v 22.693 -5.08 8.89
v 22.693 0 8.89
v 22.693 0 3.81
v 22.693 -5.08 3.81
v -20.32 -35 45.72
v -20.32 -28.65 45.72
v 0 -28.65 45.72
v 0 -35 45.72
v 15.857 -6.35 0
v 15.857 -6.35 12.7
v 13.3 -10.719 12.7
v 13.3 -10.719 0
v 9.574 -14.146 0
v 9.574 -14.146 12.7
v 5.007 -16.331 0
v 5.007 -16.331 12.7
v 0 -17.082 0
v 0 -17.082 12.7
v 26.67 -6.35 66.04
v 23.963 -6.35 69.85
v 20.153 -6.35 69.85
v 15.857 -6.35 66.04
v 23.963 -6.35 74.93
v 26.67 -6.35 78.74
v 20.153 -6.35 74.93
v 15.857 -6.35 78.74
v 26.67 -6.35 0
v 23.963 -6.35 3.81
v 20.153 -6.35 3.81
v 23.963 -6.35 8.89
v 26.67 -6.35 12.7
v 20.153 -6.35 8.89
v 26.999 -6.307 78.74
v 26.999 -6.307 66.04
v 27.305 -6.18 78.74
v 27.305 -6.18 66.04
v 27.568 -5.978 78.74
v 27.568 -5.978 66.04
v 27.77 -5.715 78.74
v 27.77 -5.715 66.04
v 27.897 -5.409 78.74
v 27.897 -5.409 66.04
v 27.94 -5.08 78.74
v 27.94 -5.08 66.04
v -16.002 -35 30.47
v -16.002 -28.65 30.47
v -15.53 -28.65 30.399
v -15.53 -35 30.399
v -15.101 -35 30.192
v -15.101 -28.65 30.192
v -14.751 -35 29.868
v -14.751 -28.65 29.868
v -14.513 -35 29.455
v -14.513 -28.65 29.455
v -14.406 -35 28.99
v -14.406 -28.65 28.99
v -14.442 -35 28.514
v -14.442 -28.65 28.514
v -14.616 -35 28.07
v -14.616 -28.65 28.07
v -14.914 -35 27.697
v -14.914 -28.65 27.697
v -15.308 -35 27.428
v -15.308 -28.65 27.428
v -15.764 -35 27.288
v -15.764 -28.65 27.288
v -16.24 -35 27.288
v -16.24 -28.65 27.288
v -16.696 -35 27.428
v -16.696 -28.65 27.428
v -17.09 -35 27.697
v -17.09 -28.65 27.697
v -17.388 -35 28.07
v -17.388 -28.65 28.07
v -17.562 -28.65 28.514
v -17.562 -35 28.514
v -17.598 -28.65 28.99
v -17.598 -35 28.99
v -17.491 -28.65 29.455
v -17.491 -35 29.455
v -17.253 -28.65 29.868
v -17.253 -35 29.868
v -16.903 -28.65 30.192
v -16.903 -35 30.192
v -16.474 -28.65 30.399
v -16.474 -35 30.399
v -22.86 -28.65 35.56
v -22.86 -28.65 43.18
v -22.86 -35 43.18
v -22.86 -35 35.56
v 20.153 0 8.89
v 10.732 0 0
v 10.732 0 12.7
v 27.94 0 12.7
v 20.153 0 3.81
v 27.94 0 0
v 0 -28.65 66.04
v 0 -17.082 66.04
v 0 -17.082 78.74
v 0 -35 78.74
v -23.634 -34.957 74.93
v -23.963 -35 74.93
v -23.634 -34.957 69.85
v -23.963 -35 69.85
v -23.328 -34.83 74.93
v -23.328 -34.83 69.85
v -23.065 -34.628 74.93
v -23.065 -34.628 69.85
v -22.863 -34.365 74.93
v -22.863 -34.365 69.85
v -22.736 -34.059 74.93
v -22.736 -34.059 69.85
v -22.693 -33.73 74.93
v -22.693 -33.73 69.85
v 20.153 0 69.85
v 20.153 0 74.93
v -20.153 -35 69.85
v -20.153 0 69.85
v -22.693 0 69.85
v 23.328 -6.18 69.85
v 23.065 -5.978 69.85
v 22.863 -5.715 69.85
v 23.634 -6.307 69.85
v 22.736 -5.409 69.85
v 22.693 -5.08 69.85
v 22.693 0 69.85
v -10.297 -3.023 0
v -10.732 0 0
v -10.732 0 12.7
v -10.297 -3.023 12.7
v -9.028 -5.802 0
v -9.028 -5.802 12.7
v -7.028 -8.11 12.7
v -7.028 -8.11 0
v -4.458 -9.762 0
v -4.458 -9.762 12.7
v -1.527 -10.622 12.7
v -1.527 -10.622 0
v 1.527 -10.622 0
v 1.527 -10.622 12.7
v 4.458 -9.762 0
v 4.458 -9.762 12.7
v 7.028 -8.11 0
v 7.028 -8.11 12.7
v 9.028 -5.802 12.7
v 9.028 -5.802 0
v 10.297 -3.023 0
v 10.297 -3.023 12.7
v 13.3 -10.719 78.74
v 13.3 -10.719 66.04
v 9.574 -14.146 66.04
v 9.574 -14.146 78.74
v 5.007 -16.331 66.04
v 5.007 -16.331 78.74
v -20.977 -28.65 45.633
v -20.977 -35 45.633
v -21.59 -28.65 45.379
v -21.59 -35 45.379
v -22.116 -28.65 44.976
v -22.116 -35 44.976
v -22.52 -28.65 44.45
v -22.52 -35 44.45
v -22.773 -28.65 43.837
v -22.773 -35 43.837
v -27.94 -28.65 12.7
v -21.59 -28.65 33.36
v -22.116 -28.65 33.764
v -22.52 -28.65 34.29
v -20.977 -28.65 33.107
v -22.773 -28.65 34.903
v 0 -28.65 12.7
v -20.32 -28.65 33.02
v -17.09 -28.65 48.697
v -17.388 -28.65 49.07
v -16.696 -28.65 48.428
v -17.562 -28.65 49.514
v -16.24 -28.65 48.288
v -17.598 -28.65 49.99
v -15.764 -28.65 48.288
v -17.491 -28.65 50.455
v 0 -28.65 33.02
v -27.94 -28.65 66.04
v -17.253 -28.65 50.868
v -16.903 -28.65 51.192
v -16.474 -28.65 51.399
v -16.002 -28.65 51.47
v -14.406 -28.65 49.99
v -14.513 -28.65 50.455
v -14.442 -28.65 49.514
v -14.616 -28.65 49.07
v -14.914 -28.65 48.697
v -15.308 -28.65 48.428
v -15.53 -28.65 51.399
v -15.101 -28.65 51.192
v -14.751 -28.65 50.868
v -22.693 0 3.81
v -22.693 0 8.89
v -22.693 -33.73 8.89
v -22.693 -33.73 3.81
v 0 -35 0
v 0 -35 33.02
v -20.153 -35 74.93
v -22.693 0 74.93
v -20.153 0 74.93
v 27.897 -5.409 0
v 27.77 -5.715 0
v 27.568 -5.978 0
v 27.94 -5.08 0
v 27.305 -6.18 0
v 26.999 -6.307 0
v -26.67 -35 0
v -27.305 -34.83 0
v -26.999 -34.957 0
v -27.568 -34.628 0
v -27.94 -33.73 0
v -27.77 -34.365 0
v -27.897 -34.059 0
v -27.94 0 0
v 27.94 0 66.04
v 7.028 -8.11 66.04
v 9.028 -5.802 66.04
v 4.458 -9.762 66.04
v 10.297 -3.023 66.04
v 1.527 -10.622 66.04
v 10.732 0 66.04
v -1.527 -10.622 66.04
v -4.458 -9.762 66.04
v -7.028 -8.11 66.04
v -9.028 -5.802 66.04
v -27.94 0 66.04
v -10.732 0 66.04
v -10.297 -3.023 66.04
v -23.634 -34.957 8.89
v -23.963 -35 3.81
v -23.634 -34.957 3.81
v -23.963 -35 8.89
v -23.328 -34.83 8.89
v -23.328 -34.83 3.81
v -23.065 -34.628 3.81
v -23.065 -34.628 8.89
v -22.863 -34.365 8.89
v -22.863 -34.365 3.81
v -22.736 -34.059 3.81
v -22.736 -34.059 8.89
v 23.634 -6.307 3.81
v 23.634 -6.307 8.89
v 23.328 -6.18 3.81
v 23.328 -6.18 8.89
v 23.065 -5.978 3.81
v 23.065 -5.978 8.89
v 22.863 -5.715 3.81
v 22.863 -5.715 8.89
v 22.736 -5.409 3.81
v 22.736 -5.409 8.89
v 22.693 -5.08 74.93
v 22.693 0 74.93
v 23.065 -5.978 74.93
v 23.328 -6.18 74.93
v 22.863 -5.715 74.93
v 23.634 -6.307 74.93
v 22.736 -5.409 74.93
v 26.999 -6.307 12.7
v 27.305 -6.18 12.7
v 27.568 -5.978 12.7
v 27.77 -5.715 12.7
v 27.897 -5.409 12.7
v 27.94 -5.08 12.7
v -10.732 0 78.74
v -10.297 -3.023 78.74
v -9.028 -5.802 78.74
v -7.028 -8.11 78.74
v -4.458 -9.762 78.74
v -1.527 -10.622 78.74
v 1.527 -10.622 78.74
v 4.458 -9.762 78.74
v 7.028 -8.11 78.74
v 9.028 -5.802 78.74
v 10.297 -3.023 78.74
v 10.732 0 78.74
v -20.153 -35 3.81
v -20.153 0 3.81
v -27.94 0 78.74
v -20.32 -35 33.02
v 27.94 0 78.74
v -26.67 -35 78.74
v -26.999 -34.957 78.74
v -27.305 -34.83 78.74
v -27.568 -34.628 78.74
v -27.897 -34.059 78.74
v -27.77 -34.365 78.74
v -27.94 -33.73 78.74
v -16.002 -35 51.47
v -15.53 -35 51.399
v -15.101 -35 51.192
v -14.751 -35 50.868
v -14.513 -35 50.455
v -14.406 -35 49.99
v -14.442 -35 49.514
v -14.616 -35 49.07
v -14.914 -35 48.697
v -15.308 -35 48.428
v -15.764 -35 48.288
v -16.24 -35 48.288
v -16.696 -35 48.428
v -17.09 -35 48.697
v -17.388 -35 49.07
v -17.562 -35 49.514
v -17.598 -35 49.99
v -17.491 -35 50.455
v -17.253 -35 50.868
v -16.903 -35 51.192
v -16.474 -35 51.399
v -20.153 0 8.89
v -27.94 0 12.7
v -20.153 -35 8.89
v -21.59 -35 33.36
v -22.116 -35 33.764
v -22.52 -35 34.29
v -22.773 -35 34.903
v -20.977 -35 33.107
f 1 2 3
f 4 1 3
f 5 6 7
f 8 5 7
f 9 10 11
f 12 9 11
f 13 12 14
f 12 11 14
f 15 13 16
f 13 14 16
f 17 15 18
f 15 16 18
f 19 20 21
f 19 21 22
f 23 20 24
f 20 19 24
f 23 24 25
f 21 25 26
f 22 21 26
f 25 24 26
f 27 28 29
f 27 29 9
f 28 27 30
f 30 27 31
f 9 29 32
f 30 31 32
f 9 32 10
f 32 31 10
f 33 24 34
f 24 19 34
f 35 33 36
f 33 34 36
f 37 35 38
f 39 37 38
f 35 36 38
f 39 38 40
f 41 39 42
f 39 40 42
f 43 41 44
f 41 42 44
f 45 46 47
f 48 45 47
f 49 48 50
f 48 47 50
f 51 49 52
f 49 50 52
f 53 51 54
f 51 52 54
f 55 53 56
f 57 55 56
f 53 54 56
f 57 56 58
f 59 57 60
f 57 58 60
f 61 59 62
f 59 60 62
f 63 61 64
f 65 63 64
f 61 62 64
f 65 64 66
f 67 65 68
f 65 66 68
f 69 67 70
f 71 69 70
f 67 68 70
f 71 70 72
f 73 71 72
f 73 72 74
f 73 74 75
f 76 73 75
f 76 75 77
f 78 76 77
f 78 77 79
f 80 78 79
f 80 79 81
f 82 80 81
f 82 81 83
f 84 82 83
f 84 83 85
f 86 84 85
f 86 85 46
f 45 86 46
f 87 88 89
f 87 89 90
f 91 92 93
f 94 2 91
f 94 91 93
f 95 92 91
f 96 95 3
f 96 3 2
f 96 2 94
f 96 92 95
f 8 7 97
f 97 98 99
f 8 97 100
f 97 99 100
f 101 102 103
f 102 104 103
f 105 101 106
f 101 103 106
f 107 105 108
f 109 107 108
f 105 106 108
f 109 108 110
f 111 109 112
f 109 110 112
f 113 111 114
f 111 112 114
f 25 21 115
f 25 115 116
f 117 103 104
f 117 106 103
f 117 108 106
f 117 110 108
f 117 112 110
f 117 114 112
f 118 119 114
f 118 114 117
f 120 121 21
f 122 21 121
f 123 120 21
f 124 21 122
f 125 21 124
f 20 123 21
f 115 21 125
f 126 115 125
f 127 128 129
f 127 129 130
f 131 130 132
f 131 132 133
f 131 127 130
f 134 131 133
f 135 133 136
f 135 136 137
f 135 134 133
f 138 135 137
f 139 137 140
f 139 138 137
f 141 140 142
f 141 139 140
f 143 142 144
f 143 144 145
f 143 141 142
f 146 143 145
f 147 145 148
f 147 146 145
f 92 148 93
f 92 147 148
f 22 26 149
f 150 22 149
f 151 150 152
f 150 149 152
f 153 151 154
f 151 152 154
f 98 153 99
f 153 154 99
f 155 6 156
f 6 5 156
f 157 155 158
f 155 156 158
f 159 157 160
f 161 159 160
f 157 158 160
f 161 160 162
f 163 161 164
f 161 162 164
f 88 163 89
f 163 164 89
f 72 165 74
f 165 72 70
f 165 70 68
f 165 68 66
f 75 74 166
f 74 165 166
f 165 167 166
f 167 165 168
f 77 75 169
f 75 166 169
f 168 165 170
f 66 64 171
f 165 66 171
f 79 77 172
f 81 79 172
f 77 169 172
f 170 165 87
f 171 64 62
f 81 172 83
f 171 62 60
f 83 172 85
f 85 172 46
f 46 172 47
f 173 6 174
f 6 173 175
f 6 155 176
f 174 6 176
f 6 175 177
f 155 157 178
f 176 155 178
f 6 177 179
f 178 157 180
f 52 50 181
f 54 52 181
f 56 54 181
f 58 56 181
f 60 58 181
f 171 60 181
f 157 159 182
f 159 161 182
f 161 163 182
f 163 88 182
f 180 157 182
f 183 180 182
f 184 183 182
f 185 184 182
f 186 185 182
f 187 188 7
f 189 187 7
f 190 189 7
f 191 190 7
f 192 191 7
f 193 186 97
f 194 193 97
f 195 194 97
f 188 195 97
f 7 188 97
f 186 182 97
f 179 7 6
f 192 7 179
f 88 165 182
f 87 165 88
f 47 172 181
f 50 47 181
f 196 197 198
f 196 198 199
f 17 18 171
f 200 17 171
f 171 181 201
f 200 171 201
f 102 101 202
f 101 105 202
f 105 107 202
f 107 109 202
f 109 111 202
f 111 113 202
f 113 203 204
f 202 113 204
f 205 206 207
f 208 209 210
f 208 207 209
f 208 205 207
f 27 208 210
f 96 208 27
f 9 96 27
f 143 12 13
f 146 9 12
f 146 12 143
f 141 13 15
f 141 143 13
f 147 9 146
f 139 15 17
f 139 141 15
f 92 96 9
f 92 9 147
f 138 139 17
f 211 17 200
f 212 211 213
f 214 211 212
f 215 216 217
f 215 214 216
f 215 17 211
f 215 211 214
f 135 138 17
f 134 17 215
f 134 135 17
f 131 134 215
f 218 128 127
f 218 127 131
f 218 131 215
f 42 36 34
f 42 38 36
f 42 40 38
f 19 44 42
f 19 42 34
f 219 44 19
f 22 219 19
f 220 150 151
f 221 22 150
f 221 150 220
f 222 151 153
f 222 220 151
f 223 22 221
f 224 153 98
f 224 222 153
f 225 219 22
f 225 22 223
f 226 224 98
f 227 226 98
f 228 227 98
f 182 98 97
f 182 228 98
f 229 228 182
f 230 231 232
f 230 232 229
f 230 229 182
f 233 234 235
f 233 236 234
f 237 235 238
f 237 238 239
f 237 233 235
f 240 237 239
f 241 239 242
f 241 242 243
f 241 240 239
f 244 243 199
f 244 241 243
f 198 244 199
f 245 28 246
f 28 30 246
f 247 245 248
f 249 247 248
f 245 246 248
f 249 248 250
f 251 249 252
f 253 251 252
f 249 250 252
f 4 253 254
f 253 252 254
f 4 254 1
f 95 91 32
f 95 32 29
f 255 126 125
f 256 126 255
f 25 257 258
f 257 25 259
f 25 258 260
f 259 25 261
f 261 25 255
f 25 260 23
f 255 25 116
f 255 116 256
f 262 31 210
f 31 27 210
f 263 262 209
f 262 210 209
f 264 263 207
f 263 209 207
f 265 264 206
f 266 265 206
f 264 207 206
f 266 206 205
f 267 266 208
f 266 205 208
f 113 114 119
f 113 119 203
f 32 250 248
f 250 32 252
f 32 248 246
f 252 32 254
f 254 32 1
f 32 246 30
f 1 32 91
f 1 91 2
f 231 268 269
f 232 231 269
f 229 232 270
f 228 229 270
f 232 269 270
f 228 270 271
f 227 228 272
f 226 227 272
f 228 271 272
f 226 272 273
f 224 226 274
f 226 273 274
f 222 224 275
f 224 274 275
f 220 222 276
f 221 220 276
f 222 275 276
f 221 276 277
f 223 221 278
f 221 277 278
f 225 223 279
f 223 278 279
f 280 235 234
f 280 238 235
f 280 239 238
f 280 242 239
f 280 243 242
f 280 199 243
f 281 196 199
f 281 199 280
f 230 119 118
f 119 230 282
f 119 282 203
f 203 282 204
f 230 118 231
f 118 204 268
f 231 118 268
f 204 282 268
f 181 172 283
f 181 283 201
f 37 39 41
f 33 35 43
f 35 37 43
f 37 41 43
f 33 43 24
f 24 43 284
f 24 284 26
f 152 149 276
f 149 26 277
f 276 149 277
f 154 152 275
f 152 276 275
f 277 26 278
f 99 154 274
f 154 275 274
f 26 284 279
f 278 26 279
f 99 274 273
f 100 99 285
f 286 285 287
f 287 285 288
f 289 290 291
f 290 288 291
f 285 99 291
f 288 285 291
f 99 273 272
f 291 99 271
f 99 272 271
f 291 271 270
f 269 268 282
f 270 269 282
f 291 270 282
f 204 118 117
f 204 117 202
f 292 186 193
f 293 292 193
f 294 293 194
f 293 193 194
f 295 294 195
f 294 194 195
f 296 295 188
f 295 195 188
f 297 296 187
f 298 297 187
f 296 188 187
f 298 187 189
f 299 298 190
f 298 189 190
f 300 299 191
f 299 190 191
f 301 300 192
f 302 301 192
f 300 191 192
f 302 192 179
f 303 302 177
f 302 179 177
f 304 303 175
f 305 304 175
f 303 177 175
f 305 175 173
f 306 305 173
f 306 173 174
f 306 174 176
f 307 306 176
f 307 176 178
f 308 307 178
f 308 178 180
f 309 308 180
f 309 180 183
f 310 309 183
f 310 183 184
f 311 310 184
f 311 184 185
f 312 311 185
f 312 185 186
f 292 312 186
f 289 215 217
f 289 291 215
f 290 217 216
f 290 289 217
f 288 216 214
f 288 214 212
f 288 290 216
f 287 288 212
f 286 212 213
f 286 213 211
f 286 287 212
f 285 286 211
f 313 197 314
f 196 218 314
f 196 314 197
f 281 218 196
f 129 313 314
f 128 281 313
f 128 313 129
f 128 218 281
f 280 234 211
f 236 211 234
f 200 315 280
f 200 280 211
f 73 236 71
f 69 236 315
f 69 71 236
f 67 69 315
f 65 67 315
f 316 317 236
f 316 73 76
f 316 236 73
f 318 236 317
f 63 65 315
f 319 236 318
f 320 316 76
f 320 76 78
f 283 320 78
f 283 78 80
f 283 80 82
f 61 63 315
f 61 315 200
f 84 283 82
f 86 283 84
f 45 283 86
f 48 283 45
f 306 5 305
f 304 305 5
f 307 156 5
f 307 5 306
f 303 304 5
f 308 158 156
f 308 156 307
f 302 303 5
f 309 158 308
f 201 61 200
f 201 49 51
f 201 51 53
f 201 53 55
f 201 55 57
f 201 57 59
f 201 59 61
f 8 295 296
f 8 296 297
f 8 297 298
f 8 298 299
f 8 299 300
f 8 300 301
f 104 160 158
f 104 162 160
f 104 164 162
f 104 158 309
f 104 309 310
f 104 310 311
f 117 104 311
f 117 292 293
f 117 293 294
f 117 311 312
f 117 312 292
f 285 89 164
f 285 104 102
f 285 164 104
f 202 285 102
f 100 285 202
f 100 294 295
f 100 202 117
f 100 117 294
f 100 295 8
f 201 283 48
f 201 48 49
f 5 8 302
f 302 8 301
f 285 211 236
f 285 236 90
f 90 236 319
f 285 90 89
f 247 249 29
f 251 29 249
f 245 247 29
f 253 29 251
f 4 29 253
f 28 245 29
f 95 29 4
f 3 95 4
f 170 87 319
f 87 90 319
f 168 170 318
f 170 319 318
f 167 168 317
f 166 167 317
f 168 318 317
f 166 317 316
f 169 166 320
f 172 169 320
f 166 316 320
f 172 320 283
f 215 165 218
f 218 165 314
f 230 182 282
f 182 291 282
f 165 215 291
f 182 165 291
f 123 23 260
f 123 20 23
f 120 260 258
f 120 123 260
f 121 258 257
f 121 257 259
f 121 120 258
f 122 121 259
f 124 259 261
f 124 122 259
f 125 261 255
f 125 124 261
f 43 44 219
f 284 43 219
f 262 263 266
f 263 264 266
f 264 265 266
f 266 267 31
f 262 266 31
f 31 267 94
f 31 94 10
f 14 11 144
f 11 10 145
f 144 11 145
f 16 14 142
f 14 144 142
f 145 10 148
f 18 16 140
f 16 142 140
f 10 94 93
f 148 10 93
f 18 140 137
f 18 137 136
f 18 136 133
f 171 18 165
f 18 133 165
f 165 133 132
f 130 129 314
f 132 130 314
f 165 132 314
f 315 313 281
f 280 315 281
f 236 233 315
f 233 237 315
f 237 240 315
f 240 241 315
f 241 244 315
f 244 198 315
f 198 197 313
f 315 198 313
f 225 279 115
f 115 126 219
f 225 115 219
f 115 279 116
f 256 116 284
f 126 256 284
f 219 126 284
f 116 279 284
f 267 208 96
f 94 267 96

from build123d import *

# Parameters (mm, degrees)
BOSS_EXTRUDE1_DEPTH = 12.7
SKETCH3_W           = 2.54
SKETCH3_H           = 5.08
CUT_EXTRUDE1_DEPTH  = 47.550334048
SKETCH4_W           = 55.88
SKETCH4_H           = 6.35
BOSS_EXTRUDE2_DEPTH = 26.67
SKETCH5_R           = 1.6
SKETCH5_W           = 31.75
SKETCH5_H           = 12.699510518
CUT_EXTRUDE3_DEPTH  = 89.325838235
CUT_EXTRUDE4_REACH  = 92.585
FILLET1_R           = 1.27
FILLET2_R           = 2.54


with BuildPart() as part:
    # Sketch2 → Boss-Extrude1 (new body)
    with BuildSketch(Plane.XY):
        with BuildLine():
            Line((-27.94, 0), (-10.7315, 0))
            ThreePointArc((-10.7315, 0), (0, -10.7315), (10.7315, 0))
            Line((10.7315, 0), (27.94, 0))
            Line((27.94, 0), (27.94, -35))
            Line((27.94, -35), (-27.94, -35))
            Line((-27.94, -35), (-27.94, 0))
        make_face()
    extrude(amount=BOSS_EXTRUDE1_DEPTH)

    # Sketch3 → Cut-Extrude1 (cut, through all)
    with BuildSketch(Plane(origin=(0, 0, 0), x_dir=(1, 0, 0), z_dir=(0, 1, 0))):
        with Locations((-21.423122, -6.35)):
            Rectangle(SKETCH3_W, SKETCH3_H)
        with Locations((21.423122, -6.35)):
            Rectangle(SKETCH3_W, SKETCH3_H)
    extrude(amount=-CUT_EXTRUDE1_DEPTH, mode=Mode.SUBTRACT)

    # Sketch4 → Boss-Extrude2 (add)
    with BuildSketch(Plane.XY.offset(12.7)):
        with Locations((0, -31.825)):
            Rectangle(SKETCH4_W, SKETCH4_H)
    extrude(amount=BOSS_EXTRUDE2_DEPTH)

    # Mirror1: part across plane


with BuildPart() as part_1:
    add(part.part)
    add(part.part.mirror(Plane(origin=(0, 0, 39.37), x_dir=(1, 0, 0), z_dir=(0, 0, -1))))

    # Sketch5 → Cut-Extrude3 (cut, through all)
    with BuildSketch(Plane(origin=(0, -28.65, 0), x_dir=(1, 0, 0), z_dir=(0, 1, 0))):
        with Locations(Location((-16.002, -28.87, 0), (0, 0, 270))):
            Circle(SKETCH5_R)
        with Locations(Location((-16.002, -49.87, 0), (0, 0, 270))):
            Circle(SKETCH5_R)
        with Locations((-6.985, -39.369755259)):
            Rectangle(SKETCH5_W, SKETCH5_H)
    extrude(amount=-CUT_EXTRUDE3_DEPTH, mode=Mode.SUBTRACT)

    # Cut-Extrude4: up to this face of the body (flat: up to its plane)
    cut_extrude4_end = Plane(part_1.part.faces().sort_by_distance((0, -18.819419433, 0))[0])
    # Sketch7 → Cut-Extrude4 (cut, up to the picked face)
    with BuildSketch(Plane.XY.offset(78.74), mode=Mode.PRIVATE) as cut_extrude4_sk1:
        with BuildLine():
            Line((0, -17.0815), (0, -35))
            Line((0, -35), (27.94, -35))
            Line((27.94, -35), (27.94, -6.35))
            Line((27.94, -6.35), (15.857337174, -6.35))
            ThreePointArc((15.857337174, -6.35), (9.573664848, -14.146468945), (0, -17.0815))
        make_face()
    cut_extrude4_tool1 = split(extrude(cut_extrude4_sk1.sketch, amount=-CUT_EXTRUDE4_REACH, mode=Mode.PRIVATE), bisect_by=cut_extrude4_end, keep=Keep.BOTH, mode=Mode.PRIVATE)
    add(cut_extrude4_tool1.solids().sort_by(Axis((15.36412, -22.474959, 78.74), (0, 0, -1)))[0], mode=Mode.SUBTRACT)

    # Fillet1
    fillet1_edges = [part_1.edges().sort_by_distance(p)[0] for p in [
        (-27.94, -35, 39.37),
        (22.693122, -6.35, 6.35),
        (22.693122, -6.35, 72.39),
        (27.94, -6.35, 72.39),
        (27.94, -6.35, 6.35),
        (-22.693122, -35, 6.35),
        (-22.693122, -35, 72.39),
    ]]
    fillet(fillet1_edges, radius=FILLET1_R)

    # Fillet2
    fillet2_edges = [part_1.edges().sort_by_distance(p)[0] for p in [
        (-22.86, -31.825, 45.719510518),
        (-22.86, -31.825, 33.02),
    ]]
    fillet(fillet2_edges, radius=FILLET2_R)


solid = part_1.part
